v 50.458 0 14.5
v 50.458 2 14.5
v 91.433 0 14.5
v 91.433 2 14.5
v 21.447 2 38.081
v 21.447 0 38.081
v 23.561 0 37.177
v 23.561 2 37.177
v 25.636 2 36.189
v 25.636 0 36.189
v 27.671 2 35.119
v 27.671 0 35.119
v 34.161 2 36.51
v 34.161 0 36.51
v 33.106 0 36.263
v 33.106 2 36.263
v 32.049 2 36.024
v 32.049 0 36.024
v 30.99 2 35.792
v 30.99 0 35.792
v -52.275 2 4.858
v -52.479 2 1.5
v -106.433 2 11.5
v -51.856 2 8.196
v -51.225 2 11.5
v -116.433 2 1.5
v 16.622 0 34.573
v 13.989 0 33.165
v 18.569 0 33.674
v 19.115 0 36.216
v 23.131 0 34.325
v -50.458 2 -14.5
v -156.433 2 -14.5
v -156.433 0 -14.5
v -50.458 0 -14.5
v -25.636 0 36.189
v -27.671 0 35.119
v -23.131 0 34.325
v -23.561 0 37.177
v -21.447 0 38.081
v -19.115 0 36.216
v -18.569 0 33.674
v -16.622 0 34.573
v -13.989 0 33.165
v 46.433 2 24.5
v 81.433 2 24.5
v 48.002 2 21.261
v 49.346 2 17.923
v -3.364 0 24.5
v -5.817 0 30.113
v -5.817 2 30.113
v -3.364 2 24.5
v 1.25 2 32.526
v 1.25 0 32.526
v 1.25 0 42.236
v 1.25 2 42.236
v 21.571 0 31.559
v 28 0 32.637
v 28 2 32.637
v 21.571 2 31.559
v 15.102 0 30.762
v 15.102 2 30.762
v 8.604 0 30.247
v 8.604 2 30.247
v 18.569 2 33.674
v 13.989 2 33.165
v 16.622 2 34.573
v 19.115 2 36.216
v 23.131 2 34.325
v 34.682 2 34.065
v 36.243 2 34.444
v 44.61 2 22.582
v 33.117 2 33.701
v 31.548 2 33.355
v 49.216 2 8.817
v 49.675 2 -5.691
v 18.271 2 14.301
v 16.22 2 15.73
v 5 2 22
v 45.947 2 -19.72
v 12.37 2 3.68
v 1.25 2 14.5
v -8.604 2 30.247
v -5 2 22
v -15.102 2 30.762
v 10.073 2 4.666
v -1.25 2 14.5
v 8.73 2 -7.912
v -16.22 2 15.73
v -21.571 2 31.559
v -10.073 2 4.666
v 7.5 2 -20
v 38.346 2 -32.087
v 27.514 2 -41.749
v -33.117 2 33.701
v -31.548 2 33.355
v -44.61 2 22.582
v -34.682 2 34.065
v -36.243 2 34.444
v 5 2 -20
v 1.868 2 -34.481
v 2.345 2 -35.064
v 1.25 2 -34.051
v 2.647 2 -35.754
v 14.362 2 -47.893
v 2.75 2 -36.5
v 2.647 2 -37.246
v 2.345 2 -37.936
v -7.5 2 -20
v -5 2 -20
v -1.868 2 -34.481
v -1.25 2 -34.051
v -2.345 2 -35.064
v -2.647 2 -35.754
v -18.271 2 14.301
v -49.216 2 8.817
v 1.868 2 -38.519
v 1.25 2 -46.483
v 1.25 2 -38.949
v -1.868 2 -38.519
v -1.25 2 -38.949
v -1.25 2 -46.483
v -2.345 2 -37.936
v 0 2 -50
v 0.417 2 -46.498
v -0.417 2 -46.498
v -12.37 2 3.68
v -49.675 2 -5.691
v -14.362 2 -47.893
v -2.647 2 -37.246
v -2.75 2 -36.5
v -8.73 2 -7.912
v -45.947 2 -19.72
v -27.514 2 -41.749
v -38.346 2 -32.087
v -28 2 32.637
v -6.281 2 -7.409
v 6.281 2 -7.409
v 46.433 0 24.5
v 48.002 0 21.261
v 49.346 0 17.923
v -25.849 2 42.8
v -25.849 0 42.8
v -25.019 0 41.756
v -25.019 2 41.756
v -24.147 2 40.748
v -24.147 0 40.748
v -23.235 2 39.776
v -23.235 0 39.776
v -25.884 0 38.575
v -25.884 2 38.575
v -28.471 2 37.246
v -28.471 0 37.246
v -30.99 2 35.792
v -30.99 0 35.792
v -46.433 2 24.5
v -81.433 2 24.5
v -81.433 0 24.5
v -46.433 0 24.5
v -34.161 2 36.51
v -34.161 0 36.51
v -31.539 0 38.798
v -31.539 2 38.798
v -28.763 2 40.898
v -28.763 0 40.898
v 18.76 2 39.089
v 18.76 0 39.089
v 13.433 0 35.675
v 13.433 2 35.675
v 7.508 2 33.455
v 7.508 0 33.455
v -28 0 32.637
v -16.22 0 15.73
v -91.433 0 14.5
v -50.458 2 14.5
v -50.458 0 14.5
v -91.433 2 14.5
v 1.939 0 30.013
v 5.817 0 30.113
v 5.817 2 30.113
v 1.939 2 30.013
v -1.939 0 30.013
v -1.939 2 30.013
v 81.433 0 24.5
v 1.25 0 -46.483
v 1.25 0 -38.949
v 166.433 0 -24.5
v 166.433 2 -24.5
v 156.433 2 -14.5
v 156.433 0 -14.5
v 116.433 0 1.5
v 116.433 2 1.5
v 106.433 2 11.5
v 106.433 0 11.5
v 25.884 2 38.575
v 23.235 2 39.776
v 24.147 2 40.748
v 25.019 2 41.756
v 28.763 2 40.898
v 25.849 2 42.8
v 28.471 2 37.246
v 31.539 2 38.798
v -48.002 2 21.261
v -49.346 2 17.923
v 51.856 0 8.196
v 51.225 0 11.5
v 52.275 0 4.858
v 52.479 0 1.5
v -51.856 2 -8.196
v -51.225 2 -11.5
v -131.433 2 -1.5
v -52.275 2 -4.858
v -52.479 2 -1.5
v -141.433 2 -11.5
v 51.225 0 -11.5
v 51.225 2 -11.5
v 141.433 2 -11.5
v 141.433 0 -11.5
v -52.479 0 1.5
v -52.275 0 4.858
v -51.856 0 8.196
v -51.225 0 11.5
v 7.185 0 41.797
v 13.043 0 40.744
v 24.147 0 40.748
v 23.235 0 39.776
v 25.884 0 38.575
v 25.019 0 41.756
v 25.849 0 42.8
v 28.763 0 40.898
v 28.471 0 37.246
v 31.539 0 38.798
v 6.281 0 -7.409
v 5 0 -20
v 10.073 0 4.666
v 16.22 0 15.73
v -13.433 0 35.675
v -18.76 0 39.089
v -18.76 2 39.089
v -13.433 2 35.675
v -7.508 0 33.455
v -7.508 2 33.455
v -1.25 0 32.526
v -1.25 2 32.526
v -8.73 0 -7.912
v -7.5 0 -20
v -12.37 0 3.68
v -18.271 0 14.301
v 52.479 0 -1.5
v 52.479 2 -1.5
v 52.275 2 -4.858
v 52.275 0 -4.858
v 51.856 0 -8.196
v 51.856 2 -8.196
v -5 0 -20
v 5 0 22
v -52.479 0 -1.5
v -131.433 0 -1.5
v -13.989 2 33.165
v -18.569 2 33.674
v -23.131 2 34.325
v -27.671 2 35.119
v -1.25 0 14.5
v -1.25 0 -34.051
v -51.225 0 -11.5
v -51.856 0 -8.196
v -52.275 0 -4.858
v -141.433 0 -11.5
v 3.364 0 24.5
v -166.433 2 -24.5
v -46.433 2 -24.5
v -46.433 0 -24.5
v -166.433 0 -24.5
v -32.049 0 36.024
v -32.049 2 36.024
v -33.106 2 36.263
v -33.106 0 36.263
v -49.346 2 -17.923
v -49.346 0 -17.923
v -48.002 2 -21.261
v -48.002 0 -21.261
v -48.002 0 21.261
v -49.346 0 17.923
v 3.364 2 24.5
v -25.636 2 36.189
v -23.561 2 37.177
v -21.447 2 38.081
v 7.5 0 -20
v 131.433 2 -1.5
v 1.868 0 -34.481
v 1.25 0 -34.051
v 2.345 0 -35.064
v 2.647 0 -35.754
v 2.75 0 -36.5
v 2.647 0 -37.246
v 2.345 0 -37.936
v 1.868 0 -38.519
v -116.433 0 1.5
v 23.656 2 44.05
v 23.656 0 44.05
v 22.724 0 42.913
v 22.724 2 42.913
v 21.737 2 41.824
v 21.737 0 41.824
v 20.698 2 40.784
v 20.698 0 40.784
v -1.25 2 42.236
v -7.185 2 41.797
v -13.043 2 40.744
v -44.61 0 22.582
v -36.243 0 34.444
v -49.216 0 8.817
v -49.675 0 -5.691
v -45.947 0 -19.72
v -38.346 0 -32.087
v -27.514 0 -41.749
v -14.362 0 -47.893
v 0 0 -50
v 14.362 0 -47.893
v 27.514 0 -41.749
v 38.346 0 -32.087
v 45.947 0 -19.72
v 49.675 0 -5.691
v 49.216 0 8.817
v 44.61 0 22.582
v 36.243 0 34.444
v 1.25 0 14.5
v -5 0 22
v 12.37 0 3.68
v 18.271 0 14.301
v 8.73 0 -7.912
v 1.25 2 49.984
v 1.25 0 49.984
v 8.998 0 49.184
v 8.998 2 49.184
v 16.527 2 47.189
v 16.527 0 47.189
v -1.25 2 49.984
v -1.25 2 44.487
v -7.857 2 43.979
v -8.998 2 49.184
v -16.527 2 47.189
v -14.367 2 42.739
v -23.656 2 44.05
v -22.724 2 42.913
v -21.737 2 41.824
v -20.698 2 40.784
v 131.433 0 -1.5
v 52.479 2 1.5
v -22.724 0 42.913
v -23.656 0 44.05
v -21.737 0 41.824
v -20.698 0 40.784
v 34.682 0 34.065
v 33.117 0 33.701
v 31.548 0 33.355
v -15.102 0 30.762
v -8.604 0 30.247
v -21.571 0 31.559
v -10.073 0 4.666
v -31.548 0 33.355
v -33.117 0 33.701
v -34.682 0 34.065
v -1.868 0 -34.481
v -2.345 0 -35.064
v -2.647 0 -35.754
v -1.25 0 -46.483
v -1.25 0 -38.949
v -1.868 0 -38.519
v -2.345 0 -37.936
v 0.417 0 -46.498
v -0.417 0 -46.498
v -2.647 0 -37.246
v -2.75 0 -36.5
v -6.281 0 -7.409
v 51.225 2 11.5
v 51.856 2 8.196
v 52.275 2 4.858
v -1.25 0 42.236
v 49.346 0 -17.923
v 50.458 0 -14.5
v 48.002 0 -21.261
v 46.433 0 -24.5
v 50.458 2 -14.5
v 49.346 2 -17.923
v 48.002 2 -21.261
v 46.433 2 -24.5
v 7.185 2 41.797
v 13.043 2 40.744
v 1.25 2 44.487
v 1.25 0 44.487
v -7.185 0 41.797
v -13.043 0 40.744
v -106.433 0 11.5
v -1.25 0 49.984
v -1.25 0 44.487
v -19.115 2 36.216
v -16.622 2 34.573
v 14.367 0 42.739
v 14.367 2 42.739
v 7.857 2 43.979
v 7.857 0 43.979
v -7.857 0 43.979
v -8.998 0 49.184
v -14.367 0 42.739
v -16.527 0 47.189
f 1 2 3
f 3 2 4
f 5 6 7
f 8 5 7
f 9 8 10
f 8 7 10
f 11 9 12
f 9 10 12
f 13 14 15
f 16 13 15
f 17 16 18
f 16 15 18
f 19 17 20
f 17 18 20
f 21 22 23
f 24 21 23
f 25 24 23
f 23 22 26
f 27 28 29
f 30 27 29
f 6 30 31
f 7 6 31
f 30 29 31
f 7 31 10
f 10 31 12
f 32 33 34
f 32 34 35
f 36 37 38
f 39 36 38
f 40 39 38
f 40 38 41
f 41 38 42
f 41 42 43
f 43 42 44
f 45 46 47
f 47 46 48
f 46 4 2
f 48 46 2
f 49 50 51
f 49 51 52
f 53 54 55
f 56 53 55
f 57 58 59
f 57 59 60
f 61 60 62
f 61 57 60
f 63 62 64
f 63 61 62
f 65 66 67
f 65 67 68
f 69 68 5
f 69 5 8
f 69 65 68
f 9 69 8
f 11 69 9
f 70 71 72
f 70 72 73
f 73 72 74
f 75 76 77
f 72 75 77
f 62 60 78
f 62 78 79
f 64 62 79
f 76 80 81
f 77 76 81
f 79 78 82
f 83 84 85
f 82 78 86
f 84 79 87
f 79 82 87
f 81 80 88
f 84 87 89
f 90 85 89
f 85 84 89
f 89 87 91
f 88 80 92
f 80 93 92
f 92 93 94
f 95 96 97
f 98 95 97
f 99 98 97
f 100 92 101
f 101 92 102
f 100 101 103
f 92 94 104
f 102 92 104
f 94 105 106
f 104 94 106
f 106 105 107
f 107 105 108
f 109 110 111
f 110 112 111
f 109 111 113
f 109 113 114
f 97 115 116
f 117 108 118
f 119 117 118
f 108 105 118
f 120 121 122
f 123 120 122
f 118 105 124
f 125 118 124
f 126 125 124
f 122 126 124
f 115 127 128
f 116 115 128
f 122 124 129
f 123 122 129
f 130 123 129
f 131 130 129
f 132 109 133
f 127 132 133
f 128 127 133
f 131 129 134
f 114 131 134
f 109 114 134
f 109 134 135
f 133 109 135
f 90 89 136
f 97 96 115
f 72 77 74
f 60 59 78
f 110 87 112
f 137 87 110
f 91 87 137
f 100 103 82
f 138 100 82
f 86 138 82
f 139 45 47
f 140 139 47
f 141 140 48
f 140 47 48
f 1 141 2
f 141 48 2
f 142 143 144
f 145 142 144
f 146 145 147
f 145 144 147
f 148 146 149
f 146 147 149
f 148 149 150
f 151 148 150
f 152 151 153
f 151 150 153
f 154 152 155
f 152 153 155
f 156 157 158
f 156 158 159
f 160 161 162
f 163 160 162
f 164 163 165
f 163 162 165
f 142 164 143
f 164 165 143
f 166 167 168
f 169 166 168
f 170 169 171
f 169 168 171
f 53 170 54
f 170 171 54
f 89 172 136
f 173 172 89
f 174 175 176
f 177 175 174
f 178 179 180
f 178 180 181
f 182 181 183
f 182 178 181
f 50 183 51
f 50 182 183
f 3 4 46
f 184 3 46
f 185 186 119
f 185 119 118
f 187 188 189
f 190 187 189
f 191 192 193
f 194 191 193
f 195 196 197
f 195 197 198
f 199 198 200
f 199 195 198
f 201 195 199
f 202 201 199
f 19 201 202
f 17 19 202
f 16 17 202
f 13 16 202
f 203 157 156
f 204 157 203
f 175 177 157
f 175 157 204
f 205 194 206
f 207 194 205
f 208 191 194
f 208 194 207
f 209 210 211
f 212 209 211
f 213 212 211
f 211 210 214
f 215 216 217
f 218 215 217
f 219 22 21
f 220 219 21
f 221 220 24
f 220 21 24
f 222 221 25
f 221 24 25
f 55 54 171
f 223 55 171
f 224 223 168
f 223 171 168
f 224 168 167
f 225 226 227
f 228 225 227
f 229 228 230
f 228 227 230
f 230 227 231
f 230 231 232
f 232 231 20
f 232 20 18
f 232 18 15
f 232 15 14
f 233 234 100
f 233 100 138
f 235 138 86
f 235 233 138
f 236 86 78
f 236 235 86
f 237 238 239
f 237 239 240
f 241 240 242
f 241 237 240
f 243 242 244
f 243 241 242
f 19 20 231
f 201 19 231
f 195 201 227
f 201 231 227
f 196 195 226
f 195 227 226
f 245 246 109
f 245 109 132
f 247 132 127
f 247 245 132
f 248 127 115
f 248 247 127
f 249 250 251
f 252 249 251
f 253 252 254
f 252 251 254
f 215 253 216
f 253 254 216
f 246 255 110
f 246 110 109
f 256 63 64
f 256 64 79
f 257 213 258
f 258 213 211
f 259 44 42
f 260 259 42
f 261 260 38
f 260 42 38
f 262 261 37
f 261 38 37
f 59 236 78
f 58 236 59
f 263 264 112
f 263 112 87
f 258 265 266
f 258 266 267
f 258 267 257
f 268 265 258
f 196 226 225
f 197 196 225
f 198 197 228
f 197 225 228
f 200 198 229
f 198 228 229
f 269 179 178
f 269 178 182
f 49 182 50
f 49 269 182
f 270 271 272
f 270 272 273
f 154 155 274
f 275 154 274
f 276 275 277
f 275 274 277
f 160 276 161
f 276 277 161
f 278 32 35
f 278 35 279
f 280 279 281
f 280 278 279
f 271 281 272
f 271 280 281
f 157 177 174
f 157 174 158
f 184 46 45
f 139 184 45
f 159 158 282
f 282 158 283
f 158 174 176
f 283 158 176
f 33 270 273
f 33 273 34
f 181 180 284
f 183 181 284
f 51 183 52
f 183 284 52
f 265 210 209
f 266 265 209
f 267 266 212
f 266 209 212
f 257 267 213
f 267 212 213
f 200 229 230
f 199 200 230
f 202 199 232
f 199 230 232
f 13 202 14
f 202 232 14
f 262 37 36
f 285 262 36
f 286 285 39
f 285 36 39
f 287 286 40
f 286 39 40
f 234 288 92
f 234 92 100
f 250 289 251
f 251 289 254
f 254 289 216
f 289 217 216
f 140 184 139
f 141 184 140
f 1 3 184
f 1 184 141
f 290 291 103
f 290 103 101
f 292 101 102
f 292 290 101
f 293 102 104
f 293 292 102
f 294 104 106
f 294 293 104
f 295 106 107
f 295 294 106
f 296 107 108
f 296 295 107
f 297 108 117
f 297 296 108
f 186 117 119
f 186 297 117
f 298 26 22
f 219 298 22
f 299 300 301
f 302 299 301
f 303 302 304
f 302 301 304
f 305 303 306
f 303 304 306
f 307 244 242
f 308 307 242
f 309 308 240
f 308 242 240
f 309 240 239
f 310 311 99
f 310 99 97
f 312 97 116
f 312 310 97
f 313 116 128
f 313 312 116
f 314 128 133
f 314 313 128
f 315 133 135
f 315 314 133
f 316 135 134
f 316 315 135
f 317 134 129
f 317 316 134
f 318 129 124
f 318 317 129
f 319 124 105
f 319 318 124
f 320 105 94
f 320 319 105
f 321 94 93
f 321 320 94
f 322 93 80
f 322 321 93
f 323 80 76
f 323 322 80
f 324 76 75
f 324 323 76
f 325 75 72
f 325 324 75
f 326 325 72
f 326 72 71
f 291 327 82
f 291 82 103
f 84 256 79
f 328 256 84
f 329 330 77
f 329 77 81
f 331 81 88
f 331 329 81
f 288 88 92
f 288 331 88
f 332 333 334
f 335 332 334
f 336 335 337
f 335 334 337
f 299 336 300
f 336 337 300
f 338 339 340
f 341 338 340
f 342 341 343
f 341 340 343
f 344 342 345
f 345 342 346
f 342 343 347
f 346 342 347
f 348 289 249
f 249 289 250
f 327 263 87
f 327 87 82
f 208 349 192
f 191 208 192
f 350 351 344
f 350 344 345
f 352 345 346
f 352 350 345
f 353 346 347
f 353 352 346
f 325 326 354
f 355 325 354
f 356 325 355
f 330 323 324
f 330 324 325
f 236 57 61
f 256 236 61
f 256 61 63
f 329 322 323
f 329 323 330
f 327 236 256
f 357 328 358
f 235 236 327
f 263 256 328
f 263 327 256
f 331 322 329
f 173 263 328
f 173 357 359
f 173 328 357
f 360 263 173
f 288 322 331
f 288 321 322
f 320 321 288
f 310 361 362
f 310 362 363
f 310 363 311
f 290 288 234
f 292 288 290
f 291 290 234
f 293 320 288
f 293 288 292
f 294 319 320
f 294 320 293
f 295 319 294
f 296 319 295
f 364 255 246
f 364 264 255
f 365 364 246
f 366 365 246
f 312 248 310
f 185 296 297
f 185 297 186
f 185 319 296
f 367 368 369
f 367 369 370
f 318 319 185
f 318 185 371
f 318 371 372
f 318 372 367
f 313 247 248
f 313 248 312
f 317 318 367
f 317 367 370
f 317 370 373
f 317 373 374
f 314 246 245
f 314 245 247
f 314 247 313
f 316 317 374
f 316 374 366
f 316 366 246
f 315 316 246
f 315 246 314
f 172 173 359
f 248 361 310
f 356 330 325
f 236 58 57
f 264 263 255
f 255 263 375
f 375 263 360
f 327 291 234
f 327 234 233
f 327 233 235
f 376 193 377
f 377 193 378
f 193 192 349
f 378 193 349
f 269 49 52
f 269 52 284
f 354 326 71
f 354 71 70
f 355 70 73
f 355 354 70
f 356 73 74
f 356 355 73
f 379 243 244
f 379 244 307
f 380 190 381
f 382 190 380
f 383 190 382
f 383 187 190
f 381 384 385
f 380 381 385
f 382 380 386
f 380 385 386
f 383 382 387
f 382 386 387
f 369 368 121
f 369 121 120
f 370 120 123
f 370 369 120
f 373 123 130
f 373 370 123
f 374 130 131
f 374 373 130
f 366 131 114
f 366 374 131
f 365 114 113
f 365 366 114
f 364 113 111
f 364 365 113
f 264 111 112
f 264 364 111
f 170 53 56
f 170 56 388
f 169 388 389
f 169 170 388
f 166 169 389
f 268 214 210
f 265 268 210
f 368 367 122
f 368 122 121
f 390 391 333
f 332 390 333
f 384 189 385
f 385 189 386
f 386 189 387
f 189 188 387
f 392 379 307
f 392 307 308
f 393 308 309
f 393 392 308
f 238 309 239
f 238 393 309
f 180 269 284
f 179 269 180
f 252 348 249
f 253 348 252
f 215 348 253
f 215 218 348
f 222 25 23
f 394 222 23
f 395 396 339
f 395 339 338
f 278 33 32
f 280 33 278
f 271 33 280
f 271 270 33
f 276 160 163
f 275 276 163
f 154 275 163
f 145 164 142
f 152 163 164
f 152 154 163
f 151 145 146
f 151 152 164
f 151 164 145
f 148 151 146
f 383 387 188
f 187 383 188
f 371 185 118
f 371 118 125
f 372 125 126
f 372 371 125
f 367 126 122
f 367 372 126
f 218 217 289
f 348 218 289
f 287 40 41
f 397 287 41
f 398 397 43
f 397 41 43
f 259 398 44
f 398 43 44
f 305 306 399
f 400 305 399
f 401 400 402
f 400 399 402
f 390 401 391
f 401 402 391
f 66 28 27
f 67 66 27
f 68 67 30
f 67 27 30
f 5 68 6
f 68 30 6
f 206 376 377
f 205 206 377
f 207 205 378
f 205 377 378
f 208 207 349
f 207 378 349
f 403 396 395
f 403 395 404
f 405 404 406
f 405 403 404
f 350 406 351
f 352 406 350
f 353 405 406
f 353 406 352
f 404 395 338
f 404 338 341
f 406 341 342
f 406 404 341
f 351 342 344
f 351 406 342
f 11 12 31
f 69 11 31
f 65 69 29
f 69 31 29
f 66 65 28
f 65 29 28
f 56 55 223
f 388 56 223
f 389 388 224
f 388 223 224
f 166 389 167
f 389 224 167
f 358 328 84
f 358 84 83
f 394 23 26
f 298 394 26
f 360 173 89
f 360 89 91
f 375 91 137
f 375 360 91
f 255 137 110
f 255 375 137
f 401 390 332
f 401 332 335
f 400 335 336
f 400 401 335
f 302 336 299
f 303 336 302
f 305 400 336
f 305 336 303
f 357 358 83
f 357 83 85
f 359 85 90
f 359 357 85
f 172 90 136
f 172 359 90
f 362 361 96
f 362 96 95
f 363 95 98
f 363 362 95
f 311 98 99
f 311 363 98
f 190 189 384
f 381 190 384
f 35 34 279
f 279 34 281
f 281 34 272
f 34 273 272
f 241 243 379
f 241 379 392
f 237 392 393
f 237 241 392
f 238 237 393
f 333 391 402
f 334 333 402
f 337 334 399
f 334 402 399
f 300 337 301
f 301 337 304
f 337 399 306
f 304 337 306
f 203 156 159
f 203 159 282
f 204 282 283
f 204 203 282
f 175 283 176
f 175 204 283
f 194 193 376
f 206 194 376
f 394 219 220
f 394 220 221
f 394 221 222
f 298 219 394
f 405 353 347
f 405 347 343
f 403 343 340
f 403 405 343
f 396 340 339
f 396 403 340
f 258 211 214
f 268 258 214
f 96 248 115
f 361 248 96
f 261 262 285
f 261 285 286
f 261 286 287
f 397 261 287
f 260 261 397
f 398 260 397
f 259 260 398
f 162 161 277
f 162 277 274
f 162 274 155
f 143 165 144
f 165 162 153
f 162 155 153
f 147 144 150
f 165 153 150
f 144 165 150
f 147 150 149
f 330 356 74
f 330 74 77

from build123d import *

# Parameters (mm, degrees)
EXTRUDE_2_DEPTH    = 2
EXTRUDE_2_2_DEPTH  = 2
EXTRUDE_2_3_DEPTH  = 2
EXTRUDE_2_4_DEPTH  = 2
EXTRUDE_2_5_DEPTH  = 2
EXTRUDE_2_6_DEPTH  = 2
EXTRUDE_2_7_DEPTH  = 2
EXTRUDE_2_8_DEPTH  = 2
EXTRUDE_2_9_DEPTH  = 2
EXTRUDE_2_10_DEPTH = 2
EXTRUDE_3_DEPTH    = 2
EXTRUDE_3_2_DEPTH  = 2
EXTRUDE_3_3_DEPTH  = 2
EXTRUDE_3_4_DEPTH  = 2
EXTRUDE_3_5_DEPTH  = 2
EXTRUDE_3_6_DEPTH  = 2
EXTRUDE_3_7_DEPTH  = 2
EXTRUDE_3_8_DEPTH  = 2


with BuildPart() as part:
    # 草图1 → 凸台-拉伸2 (new body)
    with BuildSketch(Plane(origin=(0, 0, 0), x_dir=(1, 0, 0), z_dir=(0, 1, 0))):
        with BuildLine():
            Line((5, -22), (-5, -22))
            Line((-5, -22), (-8.603844932, -30.246957118))
            ThreePointArc((-8.603844932, -30.246957118), (-18.340879186, -31.125515448), (-28, -32.636503842))
            Line((-28, -32.636503842), (-16.220094524, -15.729837593))
            ThreePointArc((-16.220094524, -15.729837593), (-7.870963062, 1.274937814), (-5, 20))
            Line((-5, 20), (-7.5, 20))
            ThreePointArc((-7.5, 20), (-10.25612454, 2.023940301), (-18.271290743, -14.300644089))
            Line((-18.271290743, -14.300644089), (-31.547646388, -33.355034156))
            ThreePointArc((-31.547646388, -33.355034156), (-33.899873465, -33.880875382), (-36.243347623, -34.444444444))
            ThreePointArc((-36.243347623, -34.444444444), (0, 50), (36.243347623, -34.444444444))
            ThreePointArc((36.243347623, -34.444444444), (33.899873465, -33.880875382), (31.547646388, -33.355034156))
            Line((31.547646388, -33.355034156), (18.271290743, -14.300644089))
            ThreePointArc((18.271290743, -14.300644089), (10.25612454, 2.023940301), (7.5, 20))
            Line((7.5, 20), (5, 20))
            ThreePointArc((5, 20), (7.870963062, 1.274937814), (16.220094524, -15.729837593))
            Line((16.220094524, -15.729837593), (28, -32.636503842))
            ThreePointArc((28, -32.636503842), (18.340879186, -31.125515448), (8.603844932, -30.246957118))
            Line((8.603844932, -30.246957118), (5, -22))
        make_face()
        with BuildLine():
            Line((-1.25, 46.483195888), (-1.25, 38.949489743))
            ThreePointArc((-1.25, 38.949489743), (-2.75, 36.5), (-1.25, 34.050510257))
            Line((-1.25, 34.050510257), (-1.25, -14.5))
            Line((-1.25, -14.5), (1.25, -14.5))
            Line((1.25, -14.5), (1.25, 34.050510257))
            ThreePointArc((1.25, 34.050510257), (2.75, 36.5), (1.25, 38.949489743))
            Line((1.25, 38.949489743), (1.25, 46.483195888))
            ThreePointArc((1.25, 46.483195888), (0, 46.5), (-1.25, 46.483195888))
        make_face(mode=Mode.SUBTRACT)
    extrude(amount=EXTRUDE_2_DEPTH)


with BuildPart() as body_2:
    # 草图1 → Extrude 2 2 (new body)
    with BuildSketch(Plane(origin=(0, 0, 0), x_dir=(1, 0, 0), z_dir=(0, 1, 0))):
        with BuildLine():
            Line((3.364198155, -24.5), (5.816954605, -30.112832307))
            ThreePointArc((5.816954605, -30.112832307), (0, -30), (-5.816954605, -30.112832307))
            Line((-5.816954605, -30.112832307), (-3.364198155, -24.5))
            Line((-3.364198155, -24.5), (3.364198155, -24.5))
        make_face()
    extrude(amount=EXTRUDE_2_2_DEPTH)


with BuildPart() as body_3:
    # 草图1 → Extrude 2 3 (new body)
    with BuildSketch(Plane(origin=(0, 0, 0), x_dir=(1, 0, 0), z_dir=(0, 1, 0))):
        with BuildLine():
            Line((-1.25, -32.526052979), (-1.25, -42.236352085))
            ThreePointArc((-1.25, -42.236352085), (-10.127900791, -41.347032979), (-18.759807178, -39.089112903))
            ThreePointArc((-18.759807178, -39.089112903), (-10.529317866, -34.408480545), (-1.25, -32.526052979))
        make_face()
    extrude(amount=EXTRUDE_2_3_DEPTH)


with BuildPart() as body_4:
    # 草图1 → Extrude 2 4 (new body)
    with BuildSketch(Plane(origin=(0, 0, 0), x_dir=(1, 0, 0), z_dir=(0, 1, 0))):
        with BuildLine():
            Line((1.25, -32.526052979), (1.25, -42.236352085))
            ThreePointArc((1.25, -42.236352085), (10.127900791, -41.347032979), (18.759807178, -39.089112903))
            ThreePointArc((18.759807178, -39.089112903), (10.529317866, -34.408480545), (1.25, -32.526052979))
        make_face()
    extrude(amount=EXTRUDE_2_4_DEPTH)


with BuildPart() as body_5:
    # 草图1 → Extrude 2 5 (new body)
    with BuildSketch(Plane(origin=(0, 0, 0), x_dir=(1, 0, 0), z_dir=(0, 1, 0))):
        with BuildLine():
            Line((1.25, -44.486868299), (1.25, -49.984372558))
            ThreePointArc((1.25, -49.984372558), (12.801526381, -48.333434828), (23.655813239, -44.05))
            ThreePointArc((23.655813239, -44.05), (22.236983731, -42.362558391), (20.698061258, -40.783870968))
            ThreePointArc((20.698061258, -40.783870968), (11.129123755, -43.44991535), (1.25, -44.486868299))
        make_face()
    extrude(amount=EXTRUDE_2_5_DEPTH)


with BuildPart() as body_6:
    # 草图1 → Extrude 2 6 (new body)
    with BuildSketch(Plane(origin=(0, 0, 0), x_dir=(1, 0, 0), z_dir=(0, 1, 0))):
        with BuildLine():
            Line((-1.25, -44.486868299), (-1.25, -49.984372558))
            ThreePointArc((-1.25, -49.984372558), (-12.801526381, -48.333434828), (-23.655813239, -44.05))
            ThreePointArc((-23.655813239, -44.05), (-22.236983731, -42.362558391), (-20.698061258, -40.783870968))
            ThreePointArc((-20.698061258, -40.783870968), (-11.129123755, -43.44991535), (-1.25, -44.486868299))
        make_face()
    extrude(amount=EXTRUDE_2_6_DEPTH)


with BuildPart() as body_7:
    # 草图1 → Extrude 2 7 (new body)
    with BuildSketch(Plane(origin=(0, 0, 0), x_dir=(1, 0, 0), z_dir=(0, 1, 0))):
        with BuildLine():
            ThreePointArc((-34.161227654, -36.510416667), (-30.169360311, -39.872417765), (-25.848791074, -42.8))
            ThreePointArc((-25.848791074, -42.8), (-24.588388651, -41.247679102), (-23.234909674, -39.775806452))
            ThreePointArc((-23.234909674, -39.775806452), (-27.185607417, -37.926295444), (-30.990183596, -35.792307692))
            ThreePointArc((-30.990183596, -35.792307692), (-32.577684342, -36.14262451), (-34.161227654, -36.510416667))
        make_face()
    extrude(amount=EXTRUDE_2_7_DEPTH)


with BuildPart() as body_8:
    # 草图1 → Extrude 2 8 (new body)
    with BuildSketch(Plane(origin=(0, 0, 0), x_dir=(1, 0, 0), z_dir=(0, 1, 0))):
        with BuildLine():
            ThreePointArc((34.161227654, -36.510416667), (32.577684342, -36.14262451), (30.990183596, -35.792307692))
            ThreePointArc((30.990183596, -35.792307692), (27.185607417, -37.926295444), (23.234909674, -39.775806452))
            ThreePointArc((23.234909674, -39.775806452), (24.588388651, -41.247679102), (25.848791074, -42.8))
            ThreePointArc((25.848791074, -42.8), (30.169360311, -39.872417765), (34.161227654, -36.510416667))
        make_face()
    extrude(amount=EXTRUDE_2_8_DEPTH)


with BuildPart() as body_9:
    # 草图1 → Extrude 2 9 (new body)
    with BuildSketch(Plane(origin=(0, 0, 0), x_dir=(1, 0, 0), z_dir=(0, 1, 0))):
        with BuildLine():
            ThreePointArc((-13.989336421, -33.164893617), (-20.852966584, -33.981495061), (-27.67080408, -35.11875))
            ThreePointArc((-27.67080408, -35.11875), (-24.603420808, -36.693657102), (-21.446790019, -38.081048387))
            ThreePointArc((-21.446790019, -38.081048387), (-17.887758627, -35.365555261), (-13.989336421, -33.164893617))
        make_face()
    extrude(amount=EXTRUDE_2_9_DEPTH)


with BuildPart() as body_10:
    # 草图1 → Extrude 2 10 (new body)
    with BuildSketch(Plane(origin=(0, 0, 0), x_dir=(1, 0, 0), z_dir=(0, 1, 0))):
        with BuildLine():
            ThreePointArc((27.67080408, -35.11875), (20.852966584, -33.981495061), (13.989336421, -33.164893617))
            ThreePointArc((13.989336421, -33.164893617), (17.887758627, -35.365555261), (21.446790019, -38.081048387))
            ThreePointArc((21.446790019, -38.081048387), (24.603420808, -36.693657102), (27.67080408, -35.11875))
        make_face()
    extrude(amount=EXTRUDE_2_10_DEPTH)


with BuildPart() as body_11:
    # 草图2 → 凸台-拉伸3 (new body)
    with BuildSketch(Plane(origin=(0, 2, 0), x_dir=(1, 0, 0), z_dir=(0, 1, 0))):
        with BuildLine():
            Line((141.432747065, 11.5), (131.432747065, 1.5))
            Line((131.432747065, 1.5), (52.478567054, 1.5))
            ThreePointArc((52.478567054, 1.5), (52.092294426, 6.530150183), (51.224993899, 11.5))
            Line((51.224993899, 11.5), (141.432747065, 11.5))
        make_face()
    extrude(amount=-EXTRUDE_3_DEPTH)


with BuildPart() as body_12:
    # 草图2 → Extrude 3 2 (new body)
    with BuildSketch(Plane(origin=(0, 2, 0), x_dir=(1, 0, 0), z_dir=(0, 1, 0))):
        with BuildLine():
            Line((-156.432747065, 14.5), (-50.457903246, 14.5))
            ThreePointArc((-50.457903246, 14.5), (-48.7026645, 19.603583105), (-46.432747065, 24.5))
            Line((-46.432747065, 24.5), (-166.432747065, 24.5))
            Line((-166.432747065, 24.5), (-156.432747065, 14.5))
        make_face()
    extrude(amount=-EXTRUDE_3_2_DEPTH)


with BuildPart() as body_13:
    # 草图2 → Extrude 3 3 (new body)
    with BuildSketch(Plane(origin=(0, 2, 0), x_dir=(1, 0, 0), z_dir=(0, 1, 0))):
        with BuildLine():
            Line((116.432747065, -1.5), (106.432747065, -11.5))
            Line((106.432747065, -11.5), (51.224993899, -11.5))
            ThreePointArc((51.224993899, -11.5), (52.092294426, -6.530150183), (52.478567054, -1.5))
            Line((52.478567054, -1.5), (116.432747065, -1.5))
        make_face()
    extrude(amount=-EXTRUDE_3_3_DEPTH)


with BuildPart() as body_14:
    # 草图2 → Extrude 3 4 (new body)
    with BuildSketch(Plane(origin=(0, 2, 0), x_dir=(1, 0, 0), z_dir=(0, 1, 0))):
        with BuildLine():
            Line((91.432747065, -14.5), (81.432747065, -24.5))
            Line((81.432747065, -24.5), (46.432747065, -24.5))
            ThreePointArc((46.432747065, -24.5), (48.7026645, -19.603583105), (50.457903246, -14.5))
            Line((50.457903246, -14.5), (91.432747065, -14.5))
        make_face()
    extrude(amount=-EXTRUDE_3_4_DEPTH)


with BuildPart() as body_15:
    # 草图2 → Extrude 3 5 (new body)
    with BuildSketch(Plane(origin=(0, 2, 0), x_dir=(1, 0, 0), z_dir=(0, 1, 0))):
        with BuildLine():
            Line((166.432747065, 24.5), (156.432747065, 14.5))
            Line((156.432747065, 14.5), (50.457903246, 14.5))
            ThreePointArc((50.457903246, 14.5), (48.7026645, 19.603583105), (46.432747065, 24.5))
            Line((46.432747065, 24.5), (166.432747065, 24.5))
        make_face()
    extrude(amount=-EXTRUDE_3_5_DEPTH)


with BuildPart() as body_16:
    # 草图2 → Extrude 3 6 (new body)
    with BuildSketch(Plane(origin=(0, 2, 0), x_dir=(1, 0, 0), z_dir=(0, 1, 0))):
        with BuildLine():
            Line((-81.432747065, -24.5), (-46.432747065, -24.5))
            ThreePointArc((-46.432747065, -24.5), (-48.7026645, -19.603583105), (-50.457903246, -14.5))
            Line((-50.457903246, -14.5), (-91.432747065, -14.5))
            Line((-91.432747065, -14.5), (-81.432747065, -24.5))
        make_face()
    extrude(amount=-EXTRUDE_3_6_DEPTH)


with BuildPart() as body_17:
    # 草图2 → Extrude 3 7 (new body)
    with BuildSketch(Plane(origin=(0, 2, 0), x_dir=(1, 0, 0), z_dir=(0, 1, 0))):
        with BuildLine():
            Line((-116.432747065, -1.5), (-52.478567054, -1.5))
            ThreePointArc((-52.478567054, -1.5), (-52.092294426, -6.530150183), (-51.224993899, -11.5))
            Line((-51.224993899, -11.5), (-106.432747065, -11.5))
            Line((-106.432747065, -11.5), (-116.432747065, -1.5))
        make_face()
    extrude(amount=-EXTRUDE_3_7_DEPTH)


with BuildPart() as body_18:
    # 草图2 → Extrude 3 8 (new body)
    with BuildSketch(Plane(origin=(0, 2, 0), x_dir=(1, 0, 0), z_dir=(0, 1, 0))):
        with BuildLine():
            Line((-141.432747065, 11.5), (-51.224993899, 11.5))
            ThreePointArc((-51.224993899, 11.5), (-52.092294426, 6.530150183), (-52.478567054, 1.5))
            Line((-52.478567054, 1.5), (-131.432747065, 1.5))
            Line((-131.432747065, 1.5), (-141.432747065, 11.5))
        make_face()
    extrude(amount=-EXTRUDE_3_8_DEPTH)


solid = Compound([part.part, body_2.part, body_3.part, body_4.part, body_5.part, body_6.part, body_7.part, body_8.part, body_9.part, body_10.part, body_11.part, body_12.part, body_13.part, body_14.part, body_15.part, body_16.part, body_17.part, body_18.part])
